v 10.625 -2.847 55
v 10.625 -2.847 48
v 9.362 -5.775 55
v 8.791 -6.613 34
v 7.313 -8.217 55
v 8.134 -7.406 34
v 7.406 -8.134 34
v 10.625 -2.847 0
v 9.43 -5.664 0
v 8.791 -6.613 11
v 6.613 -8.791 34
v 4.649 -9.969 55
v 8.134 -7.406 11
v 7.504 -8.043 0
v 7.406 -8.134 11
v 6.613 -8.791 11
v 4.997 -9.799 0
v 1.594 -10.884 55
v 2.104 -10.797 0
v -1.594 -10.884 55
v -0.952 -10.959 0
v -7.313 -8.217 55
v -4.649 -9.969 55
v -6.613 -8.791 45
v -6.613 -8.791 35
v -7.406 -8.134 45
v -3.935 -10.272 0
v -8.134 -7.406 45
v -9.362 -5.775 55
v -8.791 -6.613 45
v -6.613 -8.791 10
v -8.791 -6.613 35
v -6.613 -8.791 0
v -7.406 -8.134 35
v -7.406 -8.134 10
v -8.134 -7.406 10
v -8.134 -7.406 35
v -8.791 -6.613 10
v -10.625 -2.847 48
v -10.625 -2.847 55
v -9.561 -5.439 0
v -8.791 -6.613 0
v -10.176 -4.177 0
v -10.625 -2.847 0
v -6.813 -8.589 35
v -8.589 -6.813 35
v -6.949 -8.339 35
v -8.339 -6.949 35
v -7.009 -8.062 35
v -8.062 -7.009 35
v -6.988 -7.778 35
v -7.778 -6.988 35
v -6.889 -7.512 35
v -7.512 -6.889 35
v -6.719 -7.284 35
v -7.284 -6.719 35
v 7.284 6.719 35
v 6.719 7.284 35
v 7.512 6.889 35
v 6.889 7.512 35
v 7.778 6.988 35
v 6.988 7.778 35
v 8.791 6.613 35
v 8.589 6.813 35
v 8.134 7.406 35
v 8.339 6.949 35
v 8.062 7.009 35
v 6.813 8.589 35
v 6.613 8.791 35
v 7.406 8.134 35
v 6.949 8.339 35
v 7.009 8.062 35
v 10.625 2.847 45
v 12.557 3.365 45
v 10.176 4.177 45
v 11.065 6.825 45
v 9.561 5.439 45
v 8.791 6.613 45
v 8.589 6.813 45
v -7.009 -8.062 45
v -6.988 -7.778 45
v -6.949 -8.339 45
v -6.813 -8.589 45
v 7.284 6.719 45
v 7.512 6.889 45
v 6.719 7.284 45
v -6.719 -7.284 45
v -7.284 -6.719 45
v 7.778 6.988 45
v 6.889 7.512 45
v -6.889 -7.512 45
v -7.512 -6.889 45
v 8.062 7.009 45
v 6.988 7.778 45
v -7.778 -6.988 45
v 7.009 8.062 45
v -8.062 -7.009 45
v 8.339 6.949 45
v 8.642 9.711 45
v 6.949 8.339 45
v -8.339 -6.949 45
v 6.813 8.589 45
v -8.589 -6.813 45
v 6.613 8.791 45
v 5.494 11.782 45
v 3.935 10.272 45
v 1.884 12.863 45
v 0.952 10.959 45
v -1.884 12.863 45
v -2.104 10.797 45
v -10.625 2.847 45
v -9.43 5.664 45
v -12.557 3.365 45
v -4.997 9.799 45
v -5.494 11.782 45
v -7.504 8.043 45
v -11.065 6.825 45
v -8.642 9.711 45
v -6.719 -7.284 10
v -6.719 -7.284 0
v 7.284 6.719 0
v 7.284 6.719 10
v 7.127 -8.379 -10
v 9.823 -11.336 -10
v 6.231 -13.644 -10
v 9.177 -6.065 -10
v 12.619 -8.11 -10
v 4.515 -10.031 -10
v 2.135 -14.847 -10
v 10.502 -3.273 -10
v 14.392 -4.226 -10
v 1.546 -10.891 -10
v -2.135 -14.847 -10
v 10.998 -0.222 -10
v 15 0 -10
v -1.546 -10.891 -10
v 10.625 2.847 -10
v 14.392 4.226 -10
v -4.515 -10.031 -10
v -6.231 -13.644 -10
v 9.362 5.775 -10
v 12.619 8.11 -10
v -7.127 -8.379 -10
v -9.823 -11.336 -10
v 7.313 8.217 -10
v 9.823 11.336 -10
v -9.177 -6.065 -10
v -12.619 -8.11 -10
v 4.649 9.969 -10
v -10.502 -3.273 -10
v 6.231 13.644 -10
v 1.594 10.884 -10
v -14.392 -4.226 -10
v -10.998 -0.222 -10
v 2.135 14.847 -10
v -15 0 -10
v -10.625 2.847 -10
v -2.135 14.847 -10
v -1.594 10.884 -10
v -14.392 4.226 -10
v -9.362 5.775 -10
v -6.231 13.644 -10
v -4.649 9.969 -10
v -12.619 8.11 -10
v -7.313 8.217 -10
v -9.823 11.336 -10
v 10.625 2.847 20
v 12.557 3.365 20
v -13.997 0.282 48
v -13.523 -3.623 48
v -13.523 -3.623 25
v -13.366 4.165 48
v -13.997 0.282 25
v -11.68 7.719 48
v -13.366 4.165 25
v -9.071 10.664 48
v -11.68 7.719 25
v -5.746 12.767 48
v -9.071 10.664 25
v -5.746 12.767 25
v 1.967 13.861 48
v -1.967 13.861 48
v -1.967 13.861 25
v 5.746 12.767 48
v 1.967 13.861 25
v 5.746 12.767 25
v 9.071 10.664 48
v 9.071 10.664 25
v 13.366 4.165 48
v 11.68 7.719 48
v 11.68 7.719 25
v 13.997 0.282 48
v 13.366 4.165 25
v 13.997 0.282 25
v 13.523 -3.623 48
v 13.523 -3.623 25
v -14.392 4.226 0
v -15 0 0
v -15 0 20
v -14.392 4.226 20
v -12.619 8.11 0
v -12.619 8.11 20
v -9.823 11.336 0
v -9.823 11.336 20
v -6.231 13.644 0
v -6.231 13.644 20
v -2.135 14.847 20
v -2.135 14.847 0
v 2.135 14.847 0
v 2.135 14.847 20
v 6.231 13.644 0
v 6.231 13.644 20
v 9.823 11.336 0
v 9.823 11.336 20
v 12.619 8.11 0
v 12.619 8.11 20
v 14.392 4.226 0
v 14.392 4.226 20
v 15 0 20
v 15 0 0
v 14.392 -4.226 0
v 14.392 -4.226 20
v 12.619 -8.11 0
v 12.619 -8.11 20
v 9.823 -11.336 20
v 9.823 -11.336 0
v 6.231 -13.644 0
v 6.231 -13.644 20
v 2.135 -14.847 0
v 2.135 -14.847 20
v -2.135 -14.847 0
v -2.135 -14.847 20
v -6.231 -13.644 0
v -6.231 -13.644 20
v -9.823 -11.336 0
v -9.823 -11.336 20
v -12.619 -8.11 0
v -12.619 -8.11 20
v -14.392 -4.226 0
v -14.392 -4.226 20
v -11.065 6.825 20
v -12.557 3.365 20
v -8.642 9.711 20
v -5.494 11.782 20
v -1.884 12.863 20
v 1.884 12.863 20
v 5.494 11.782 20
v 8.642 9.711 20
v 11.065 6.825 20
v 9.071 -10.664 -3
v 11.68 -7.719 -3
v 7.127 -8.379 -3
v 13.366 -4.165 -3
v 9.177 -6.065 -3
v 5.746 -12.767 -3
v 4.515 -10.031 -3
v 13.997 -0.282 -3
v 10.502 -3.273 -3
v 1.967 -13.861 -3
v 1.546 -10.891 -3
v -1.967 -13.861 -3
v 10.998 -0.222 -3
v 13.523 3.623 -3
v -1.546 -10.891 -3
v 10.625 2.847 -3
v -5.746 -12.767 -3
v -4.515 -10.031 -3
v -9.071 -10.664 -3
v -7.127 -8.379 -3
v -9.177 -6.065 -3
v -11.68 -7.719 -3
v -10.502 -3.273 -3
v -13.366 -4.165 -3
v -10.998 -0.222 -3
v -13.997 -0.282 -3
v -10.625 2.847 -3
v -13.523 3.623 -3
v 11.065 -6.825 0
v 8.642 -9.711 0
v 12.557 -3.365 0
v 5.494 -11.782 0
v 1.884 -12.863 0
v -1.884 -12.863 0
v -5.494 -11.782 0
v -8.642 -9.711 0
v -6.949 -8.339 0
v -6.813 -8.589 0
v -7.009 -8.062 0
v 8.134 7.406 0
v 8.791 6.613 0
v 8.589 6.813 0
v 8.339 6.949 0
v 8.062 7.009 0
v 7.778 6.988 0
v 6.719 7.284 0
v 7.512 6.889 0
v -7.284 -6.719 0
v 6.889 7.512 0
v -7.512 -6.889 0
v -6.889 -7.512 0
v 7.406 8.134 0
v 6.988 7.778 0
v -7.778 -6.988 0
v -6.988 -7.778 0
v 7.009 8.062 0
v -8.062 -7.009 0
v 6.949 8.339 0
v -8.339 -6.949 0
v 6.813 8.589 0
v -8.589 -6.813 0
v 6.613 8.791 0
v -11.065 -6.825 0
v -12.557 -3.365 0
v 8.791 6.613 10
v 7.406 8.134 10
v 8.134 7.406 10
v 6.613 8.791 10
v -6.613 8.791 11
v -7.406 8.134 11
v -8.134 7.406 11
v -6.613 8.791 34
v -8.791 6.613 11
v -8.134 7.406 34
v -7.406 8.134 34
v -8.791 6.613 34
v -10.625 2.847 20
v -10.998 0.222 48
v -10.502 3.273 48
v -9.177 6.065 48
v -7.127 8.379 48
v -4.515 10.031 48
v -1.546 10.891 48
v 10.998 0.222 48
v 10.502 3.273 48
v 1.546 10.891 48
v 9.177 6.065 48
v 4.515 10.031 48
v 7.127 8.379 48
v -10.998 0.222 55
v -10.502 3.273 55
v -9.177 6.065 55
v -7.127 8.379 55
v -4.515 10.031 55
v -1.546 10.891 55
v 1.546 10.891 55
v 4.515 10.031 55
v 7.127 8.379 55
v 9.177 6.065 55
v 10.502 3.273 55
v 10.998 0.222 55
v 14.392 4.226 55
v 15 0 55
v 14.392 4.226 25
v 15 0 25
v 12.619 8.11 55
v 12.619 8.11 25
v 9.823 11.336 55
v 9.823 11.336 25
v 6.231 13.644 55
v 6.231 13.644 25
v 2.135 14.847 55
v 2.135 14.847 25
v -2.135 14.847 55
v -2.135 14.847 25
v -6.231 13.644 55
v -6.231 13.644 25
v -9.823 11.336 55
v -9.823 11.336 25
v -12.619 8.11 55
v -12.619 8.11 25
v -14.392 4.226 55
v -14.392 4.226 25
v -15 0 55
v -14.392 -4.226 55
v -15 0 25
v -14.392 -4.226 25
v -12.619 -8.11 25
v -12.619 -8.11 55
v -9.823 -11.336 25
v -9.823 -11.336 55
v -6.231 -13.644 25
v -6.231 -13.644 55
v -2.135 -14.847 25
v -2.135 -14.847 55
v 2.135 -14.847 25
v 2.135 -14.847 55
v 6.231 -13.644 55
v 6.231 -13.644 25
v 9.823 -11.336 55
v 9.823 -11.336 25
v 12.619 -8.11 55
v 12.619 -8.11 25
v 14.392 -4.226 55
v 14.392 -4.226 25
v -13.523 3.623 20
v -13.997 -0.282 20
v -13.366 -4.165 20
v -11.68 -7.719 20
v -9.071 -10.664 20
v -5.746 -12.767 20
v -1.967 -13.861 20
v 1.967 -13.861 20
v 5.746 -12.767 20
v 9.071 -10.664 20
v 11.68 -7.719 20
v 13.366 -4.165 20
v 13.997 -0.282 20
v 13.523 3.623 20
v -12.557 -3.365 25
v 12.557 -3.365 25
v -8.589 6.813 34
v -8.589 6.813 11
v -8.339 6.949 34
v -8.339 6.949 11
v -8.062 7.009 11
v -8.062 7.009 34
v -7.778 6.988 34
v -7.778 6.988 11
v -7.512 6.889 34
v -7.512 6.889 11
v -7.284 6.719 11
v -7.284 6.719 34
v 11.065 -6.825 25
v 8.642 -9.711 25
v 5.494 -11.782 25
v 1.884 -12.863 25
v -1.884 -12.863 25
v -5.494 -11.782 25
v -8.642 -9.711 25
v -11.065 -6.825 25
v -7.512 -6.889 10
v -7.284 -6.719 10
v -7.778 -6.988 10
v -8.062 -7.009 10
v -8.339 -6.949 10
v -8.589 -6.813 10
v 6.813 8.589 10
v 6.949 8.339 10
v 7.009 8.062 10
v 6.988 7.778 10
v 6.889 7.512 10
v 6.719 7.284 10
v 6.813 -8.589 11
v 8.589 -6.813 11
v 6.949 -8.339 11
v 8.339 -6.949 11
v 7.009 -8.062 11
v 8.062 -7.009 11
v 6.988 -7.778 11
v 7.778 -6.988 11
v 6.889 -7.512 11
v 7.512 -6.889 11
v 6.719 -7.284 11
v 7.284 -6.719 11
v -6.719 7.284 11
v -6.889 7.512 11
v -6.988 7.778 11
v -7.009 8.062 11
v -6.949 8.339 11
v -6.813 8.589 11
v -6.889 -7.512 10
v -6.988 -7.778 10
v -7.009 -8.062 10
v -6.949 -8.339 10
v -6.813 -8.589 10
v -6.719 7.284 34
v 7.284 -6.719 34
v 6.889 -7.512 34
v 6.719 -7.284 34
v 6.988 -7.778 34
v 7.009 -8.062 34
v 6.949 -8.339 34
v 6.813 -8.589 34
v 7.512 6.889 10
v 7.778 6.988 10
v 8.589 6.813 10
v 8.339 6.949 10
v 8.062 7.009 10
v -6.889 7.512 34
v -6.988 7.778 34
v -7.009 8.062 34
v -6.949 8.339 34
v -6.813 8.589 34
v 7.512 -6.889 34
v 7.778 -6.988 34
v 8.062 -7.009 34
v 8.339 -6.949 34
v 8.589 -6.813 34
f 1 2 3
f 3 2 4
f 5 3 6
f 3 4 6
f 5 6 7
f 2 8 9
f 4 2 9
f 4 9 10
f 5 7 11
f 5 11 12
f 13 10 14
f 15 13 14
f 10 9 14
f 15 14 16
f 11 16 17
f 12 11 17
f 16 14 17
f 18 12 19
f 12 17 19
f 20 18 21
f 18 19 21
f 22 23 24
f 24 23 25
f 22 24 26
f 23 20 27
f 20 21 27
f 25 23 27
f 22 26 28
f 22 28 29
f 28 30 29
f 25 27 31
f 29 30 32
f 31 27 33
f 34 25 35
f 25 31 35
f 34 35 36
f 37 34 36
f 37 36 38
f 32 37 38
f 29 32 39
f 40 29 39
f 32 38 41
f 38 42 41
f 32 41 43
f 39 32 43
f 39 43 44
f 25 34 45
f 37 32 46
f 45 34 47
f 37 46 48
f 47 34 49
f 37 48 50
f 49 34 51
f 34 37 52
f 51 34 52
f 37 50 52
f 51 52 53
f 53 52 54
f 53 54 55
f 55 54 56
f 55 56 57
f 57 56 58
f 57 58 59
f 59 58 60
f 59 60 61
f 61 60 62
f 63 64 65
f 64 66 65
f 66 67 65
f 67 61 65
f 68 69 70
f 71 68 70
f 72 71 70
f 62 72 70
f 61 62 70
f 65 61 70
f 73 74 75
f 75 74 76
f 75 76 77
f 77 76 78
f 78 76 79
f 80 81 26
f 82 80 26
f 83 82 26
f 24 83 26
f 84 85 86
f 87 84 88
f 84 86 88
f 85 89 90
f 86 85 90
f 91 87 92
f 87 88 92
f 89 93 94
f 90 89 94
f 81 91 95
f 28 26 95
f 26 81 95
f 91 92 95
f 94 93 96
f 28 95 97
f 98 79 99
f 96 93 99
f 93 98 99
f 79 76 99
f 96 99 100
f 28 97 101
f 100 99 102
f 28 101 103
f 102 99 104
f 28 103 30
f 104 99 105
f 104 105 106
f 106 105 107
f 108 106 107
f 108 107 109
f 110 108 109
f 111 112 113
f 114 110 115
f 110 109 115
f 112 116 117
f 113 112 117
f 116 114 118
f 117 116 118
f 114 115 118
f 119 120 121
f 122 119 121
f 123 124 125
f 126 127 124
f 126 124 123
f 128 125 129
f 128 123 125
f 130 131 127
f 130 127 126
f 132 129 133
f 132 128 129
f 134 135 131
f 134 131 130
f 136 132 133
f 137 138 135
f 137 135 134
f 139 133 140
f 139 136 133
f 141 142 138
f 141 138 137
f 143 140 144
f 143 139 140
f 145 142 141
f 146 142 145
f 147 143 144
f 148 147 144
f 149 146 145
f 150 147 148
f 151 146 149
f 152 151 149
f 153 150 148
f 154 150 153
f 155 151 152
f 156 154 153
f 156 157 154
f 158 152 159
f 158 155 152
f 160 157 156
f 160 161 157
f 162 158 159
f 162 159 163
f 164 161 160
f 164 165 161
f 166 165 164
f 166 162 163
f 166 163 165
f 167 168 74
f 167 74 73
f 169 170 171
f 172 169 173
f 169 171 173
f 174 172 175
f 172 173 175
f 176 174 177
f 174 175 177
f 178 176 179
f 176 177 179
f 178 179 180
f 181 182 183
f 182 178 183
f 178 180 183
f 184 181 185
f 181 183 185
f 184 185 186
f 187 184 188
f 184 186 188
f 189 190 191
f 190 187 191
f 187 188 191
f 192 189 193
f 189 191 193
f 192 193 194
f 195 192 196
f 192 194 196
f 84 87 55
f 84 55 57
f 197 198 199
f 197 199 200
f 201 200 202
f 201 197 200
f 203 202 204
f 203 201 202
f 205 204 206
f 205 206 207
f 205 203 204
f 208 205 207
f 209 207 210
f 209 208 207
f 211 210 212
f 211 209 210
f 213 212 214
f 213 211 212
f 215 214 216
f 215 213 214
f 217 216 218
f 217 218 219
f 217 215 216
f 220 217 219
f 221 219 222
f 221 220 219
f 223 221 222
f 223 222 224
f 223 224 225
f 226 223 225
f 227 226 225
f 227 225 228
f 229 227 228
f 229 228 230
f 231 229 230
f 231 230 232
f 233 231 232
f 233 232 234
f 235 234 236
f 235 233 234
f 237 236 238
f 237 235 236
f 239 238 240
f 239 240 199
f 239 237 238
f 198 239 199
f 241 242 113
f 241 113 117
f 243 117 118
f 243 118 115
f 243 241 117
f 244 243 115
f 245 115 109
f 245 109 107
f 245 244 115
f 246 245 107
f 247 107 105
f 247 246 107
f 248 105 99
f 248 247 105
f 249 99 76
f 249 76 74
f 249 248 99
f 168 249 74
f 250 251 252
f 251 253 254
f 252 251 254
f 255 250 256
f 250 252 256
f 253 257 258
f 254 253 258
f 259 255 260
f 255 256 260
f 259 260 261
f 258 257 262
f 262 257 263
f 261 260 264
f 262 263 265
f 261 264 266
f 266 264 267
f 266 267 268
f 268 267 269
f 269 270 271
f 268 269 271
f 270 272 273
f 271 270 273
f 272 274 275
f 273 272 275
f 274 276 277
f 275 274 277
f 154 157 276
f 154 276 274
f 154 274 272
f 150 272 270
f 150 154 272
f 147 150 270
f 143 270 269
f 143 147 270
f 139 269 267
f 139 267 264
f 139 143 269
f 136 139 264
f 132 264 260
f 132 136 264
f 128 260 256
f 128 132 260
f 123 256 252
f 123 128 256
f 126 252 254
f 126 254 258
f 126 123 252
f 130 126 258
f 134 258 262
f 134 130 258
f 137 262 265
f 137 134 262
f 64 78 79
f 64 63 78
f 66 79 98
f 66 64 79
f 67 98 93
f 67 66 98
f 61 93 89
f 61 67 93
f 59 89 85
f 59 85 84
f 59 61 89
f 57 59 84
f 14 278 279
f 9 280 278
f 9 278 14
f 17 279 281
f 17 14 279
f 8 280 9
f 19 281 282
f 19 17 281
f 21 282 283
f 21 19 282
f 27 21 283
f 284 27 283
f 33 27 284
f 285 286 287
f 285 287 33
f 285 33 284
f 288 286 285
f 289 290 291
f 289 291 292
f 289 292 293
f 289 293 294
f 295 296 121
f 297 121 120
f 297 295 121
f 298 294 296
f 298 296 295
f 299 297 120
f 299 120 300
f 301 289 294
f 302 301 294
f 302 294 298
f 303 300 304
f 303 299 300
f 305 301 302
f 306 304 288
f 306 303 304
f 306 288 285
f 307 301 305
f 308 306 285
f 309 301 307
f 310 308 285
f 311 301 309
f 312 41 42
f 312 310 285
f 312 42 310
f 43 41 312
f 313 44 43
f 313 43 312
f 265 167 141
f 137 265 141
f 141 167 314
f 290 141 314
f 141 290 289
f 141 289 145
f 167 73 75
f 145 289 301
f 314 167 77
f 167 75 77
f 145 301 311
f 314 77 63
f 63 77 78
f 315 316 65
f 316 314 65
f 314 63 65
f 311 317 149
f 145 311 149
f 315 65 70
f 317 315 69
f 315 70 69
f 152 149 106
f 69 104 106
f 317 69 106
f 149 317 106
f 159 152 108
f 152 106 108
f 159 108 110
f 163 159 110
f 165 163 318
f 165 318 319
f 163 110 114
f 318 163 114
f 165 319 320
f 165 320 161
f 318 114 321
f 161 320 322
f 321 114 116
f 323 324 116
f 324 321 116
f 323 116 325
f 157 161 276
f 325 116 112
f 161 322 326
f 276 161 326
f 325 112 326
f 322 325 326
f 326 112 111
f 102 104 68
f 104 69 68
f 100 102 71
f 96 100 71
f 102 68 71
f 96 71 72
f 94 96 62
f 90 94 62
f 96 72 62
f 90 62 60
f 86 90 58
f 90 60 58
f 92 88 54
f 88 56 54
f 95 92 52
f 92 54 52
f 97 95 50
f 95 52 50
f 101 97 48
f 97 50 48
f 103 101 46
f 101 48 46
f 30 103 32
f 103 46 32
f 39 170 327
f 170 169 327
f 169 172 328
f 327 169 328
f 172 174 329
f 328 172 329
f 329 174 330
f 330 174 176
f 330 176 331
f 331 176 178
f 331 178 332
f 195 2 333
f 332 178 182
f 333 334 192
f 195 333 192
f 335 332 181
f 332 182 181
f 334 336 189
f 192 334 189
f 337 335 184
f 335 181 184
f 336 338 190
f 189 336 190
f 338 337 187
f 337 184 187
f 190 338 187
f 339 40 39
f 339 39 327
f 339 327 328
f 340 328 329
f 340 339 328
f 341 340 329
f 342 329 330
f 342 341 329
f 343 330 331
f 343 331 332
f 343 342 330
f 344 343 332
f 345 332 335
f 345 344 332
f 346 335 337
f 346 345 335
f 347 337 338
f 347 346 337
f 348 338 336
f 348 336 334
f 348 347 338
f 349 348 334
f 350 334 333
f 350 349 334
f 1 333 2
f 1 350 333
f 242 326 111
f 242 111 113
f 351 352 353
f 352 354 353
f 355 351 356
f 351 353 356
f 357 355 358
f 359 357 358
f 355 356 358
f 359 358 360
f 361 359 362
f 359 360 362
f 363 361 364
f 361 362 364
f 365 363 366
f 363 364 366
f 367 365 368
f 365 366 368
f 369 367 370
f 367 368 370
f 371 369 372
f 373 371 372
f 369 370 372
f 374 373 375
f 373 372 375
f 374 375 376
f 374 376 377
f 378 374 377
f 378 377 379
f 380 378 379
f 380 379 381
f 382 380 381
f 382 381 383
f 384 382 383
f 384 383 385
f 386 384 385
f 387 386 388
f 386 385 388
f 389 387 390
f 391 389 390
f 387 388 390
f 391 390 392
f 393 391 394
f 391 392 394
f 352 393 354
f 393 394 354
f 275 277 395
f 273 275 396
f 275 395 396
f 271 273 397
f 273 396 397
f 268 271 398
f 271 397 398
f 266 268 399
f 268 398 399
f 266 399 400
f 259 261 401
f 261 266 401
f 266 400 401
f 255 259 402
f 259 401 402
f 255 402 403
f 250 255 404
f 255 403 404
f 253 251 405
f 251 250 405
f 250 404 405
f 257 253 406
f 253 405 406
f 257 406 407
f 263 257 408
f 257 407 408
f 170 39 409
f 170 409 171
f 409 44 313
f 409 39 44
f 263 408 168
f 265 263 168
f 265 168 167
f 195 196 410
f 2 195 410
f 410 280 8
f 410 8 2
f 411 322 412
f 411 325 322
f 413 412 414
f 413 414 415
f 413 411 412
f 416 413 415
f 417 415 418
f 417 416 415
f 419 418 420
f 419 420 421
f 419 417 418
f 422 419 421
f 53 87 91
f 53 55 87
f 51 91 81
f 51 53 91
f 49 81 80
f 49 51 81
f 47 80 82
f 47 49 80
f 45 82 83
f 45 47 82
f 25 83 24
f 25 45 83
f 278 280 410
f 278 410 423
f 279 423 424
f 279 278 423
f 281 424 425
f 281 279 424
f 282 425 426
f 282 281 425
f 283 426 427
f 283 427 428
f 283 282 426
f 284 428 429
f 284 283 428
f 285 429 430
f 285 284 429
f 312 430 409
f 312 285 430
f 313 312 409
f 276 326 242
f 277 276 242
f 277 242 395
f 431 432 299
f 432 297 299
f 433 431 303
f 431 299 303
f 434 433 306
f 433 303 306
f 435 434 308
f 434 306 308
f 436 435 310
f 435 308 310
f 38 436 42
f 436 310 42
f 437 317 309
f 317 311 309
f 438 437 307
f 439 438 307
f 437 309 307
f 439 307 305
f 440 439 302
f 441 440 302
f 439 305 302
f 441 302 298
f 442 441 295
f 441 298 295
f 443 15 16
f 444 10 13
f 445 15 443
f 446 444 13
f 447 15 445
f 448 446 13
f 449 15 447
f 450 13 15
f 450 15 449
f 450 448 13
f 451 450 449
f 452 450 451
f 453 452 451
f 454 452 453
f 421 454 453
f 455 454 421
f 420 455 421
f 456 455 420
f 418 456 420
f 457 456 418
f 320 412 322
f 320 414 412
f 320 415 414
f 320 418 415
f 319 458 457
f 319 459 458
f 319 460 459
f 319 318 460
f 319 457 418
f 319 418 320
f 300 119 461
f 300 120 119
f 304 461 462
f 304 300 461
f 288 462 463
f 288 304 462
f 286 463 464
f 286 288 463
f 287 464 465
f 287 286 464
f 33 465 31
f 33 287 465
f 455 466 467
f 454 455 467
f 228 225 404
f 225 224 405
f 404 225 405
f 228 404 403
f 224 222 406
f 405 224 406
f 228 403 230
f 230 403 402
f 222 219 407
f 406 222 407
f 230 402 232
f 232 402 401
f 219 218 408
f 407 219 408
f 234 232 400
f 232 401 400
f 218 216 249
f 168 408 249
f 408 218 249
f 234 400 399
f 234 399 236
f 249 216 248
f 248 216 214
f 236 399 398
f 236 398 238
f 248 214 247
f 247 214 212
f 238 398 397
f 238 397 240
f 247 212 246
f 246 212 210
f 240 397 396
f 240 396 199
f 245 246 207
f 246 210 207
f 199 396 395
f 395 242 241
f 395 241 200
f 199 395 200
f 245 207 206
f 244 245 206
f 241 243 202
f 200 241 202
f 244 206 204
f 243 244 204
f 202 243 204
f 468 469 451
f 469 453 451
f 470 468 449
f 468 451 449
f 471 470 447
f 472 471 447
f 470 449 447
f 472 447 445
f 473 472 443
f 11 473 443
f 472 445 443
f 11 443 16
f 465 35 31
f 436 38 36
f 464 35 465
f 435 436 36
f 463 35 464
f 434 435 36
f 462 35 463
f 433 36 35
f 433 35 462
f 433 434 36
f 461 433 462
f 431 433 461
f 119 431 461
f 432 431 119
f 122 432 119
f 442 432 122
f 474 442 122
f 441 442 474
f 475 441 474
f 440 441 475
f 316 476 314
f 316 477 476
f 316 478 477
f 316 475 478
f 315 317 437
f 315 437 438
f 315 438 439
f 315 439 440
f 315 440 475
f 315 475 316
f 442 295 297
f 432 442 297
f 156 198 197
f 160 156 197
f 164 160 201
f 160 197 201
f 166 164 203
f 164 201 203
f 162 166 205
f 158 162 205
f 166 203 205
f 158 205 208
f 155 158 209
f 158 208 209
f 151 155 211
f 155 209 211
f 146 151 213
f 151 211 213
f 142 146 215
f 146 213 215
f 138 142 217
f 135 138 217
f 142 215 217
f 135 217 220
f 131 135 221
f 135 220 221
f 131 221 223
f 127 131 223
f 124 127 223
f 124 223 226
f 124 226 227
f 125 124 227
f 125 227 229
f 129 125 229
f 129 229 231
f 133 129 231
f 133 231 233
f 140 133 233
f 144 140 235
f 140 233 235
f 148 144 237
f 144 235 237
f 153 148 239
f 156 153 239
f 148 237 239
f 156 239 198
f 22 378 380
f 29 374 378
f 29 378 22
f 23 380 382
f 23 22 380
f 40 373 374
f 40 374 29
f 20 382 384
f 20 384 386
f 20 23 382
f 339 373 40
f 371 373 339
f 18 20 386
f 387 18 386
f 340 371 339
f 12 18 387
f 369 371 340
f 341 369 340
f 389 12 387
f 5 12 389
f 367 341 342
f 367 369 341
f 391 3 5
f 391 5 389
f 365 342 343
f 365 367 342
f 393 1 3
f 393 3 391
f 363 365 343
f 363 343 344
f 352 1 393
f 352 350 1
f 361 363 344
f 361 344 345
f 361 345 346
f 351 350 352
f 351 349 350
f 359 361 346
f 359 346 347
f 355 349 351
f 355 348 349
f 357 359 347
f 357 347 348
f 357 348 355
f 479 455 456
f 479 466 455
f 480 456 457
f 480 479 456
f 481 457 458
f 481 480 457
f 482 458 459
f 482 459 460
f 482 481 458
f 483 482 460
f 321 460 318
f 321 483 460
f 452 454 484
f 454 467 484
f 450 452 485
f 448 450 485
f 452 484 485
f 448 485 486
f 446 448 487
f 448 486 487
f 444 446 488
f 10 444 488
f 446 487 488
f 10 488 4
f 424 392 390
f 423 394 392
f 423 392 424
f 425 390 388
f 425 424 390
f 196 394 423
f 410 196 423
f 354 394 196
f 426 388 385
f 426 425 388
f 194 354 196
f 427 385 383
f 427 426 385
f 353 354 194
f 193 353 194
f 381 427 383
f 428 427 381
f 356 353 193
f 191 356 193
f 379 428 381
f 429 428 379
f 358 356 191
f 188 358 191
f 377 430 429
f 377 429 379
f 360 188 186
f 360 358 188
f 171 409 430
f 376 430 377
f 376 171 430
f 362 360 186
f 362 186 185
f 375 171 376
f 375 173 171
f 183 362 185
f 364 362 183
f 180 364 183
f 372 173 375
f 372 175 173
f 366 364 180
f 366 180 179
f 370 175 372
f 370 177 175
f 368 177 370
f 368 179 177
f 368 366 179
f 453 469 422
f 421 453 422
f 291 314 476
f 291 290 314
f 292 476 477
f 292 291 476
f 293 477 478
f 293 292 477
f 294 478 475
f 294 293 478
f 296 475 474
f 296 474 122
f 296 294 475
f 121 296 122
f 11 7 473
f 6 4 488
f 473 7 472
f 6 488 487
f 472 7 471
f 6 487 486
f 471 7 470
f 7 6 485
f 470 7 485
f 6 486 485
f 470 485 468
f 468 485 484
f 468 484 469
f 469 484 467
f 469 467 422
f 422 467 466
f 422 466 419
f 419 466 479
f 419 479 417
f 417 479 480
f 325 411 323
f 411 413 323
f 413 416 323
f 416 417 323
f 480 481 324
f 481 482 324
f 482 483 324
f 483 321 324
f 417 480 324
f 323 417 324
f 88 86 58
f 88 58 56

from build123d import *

# Parameters (mm, degrees)
SKETCH1_R                = 15
BOSS_EXTRUDE1_DEPTH      = 45
SKETCH2_R                = 15
SKETCH2_R_2              = 13
CUT_EXTRUDE1_DEPTH       = 25
BOSS_EXTRUDE4_DEPTH      = 10
SKETCH6_R                = 15
BOSS_EXTRUDE5_DEPTH      = 20
BOSS_EXTRUDE6_DEPTH      = 45
BOSS_EXTRUDE7_DEPTH      = 11.5
BOSS_EXTRUDE7_DEPTH_BACK = 11.5
FILLET1_R                = 1
SKETCH9_R                = 15
BOSS_EXTRUDE8_DEPTH      = 10
BOSS_EXTRUDE9_DEPTH      = 7
SKETCH11_R               = 15
BOSS_EXTRUDE10_DEPTH     = 10
BOSS_EXTRUDE11_DEPTH     = 7


with BuildPart() as part:
    # Sketch1 → Boss-Extrude1 (new body)
    with BuildSketch(Plane.XY):
        Circle(SKETCH1_R)
        with BuildLine():
            Line((-10.625184089, -2.847009496), (-13.522961568, -3.623466631))
            ThreePointArc((-13.522961568, -3.623466631), (0, 14), (13.522961568, -3.623466631))
            Line((13.522961568, -3.623466631), (10.625184089, -2.847009496))
            ThreePointArc((10.625184089, -2.847009496), (0, -11), (-10.625184089, -2.847009496))
        make_face(mode=Mode.SUBTRACT)
    extrude(amount=BOSS_EXTRUDE1_DEPTH)

    # Sketch2 → Cut-Extrude1 (cut)
    with BuildSketch(Plane(origin=(0, 0, 0), x_dir=(-1, 0, 0), z_dir=(0, 0, -1))):
        Circle(SKETCH2_R)
        Circle(SKETCH2_R_2, mode=Mode.SUBTRACT)
    extrude(amount=-CUT_EXTRUDE1_DEPTH, mode=Mode.SUBTRACT)

    # Sketch5 → Boss-Extrude4 (add)
    with BuildSketch(Plane.XY.offset(45)):
        Polygon((-7.495331881, -8.061017306), (8.061017306, 7.495331881), (7.495331881, 8.061017306), (-8.061017306, -7.495331881), align=None)
    boss_extrude4 = extrude(amount=-BOSS_EXTRUDE4_DEPTH)

    # Mirror1: Boss-Extrude4 across plane
    add(boss_extrude4.mirror(Plane.XY.offset(22.5)))

    # Sketch6 → Boss-Extrude5 (add)
    with BuildSketch(Plane(origin=(0, 0, 0), x_dir=(-1, 0, 0), z_dir=(0, 0, -1))):
        Circle(SKETCH6_R)
        with BuildLine():
            Line((10.625184089, 2.847009496), (13.522961568, 3.623466631))
            ThreePointArc((13.522961568, 3.623466631), (0, -14), (-13.522961568, 3.623466631))
            Line((-13.522961568, 3.623466631), (-10.625184089, 2.847009496))
            ThreePointArc((-10.625184089, 2.847009496), (0, 11), (10.625184089, 2.847009496))
        make_face(mode=Mode.SUBTRACT)
    extrude(amount=-BOSS_EXTRUDE5_DEPTH)

    # Sketch7 → Boss-Extrude6 (add)
    with BuildSketch(Plane(origin=(0, 0, 0), x_dir=(-1, 0, 0), z_dir=(0, 0, -1))):
        with BuildLine():
            Line((-12.557035742, 3.364647586), (-10.625184089, 2.847009496))
            ThreePointArc((-10.625184089, 2.847009496), (0, 11), (10.625184089, 2.847009496))
            Line((10.625184089, 2.847009496), (12.557035742, 3.364647586))
            ThreePointArc((12.557035742, 3.364647586), (0, 13), (-12.557035742, 3.364647586))
        make_face()
    extrude(amount=-BOSS_EXTRUDE6_DEPTH)

    # Sketch8 → Boss-Extrude7 (add, two sides)
    with BuildSketch(Plane.XY.offset(22.5)) as boss_extrude7_sk:
        Polygon((8.061017306, -7.495331881), (7.495331881, -8.061017306), (-8.061017306, 7.495331881), (-7.495331881, 8.061017306), align=None)
    extrude(amount=BOSS_EXTRUDE7_DEPTH)
    extrude(boss_extrude7_sk.sketch, amount=-BOSS_EXTRUDE7_DEPTH_BACK)

    # Fillet1
    fillet1_edges = [part.edges().sort_by_distance(p)[0] for p in [
        (7.490187585, 8.05587301, 40),
        (8.05587301, 7.490187585, 40),
        (-8.05587301, 7.490187585, 22.5),
        (-7.490187585, 8.05587301, 22.5),
        (8.05587301, -7.490187585, 22.5),
        (7.490187585, -8.05587301, 22.5),
        (-7.490187585, -8.05587301, 40),
        (-8.05587301, -7.490187585, 40),
        (-8.05587301, -7.490187585, 5),
        (-7.490187585, -8.05587301, 5),
        (8.05587301, 7.490187585, 5),
        (7.490187585, 8.05587301, 5),
    ]]
    fillet(fillet1_edges, radius=FILLET1_R)

    # Sketch9 → Boss-Extrude8 (add)
    with BuildSketch(Plane.XY.offset(45)):
        Circle(SKETCH9_R)
        with BuildLine():
            Line((13.522961568, -3.623466631), (10.625184089, -2.847009496))
            ThreePointArc((10.625184089, -2.847009496), (0, -11), (-10.625184089, -2.847009496))
            Line((-10.625184089, -2.847009496), (-13.522961568, -3.623466631))
            ThreePointArc((-13.522961568, -3.623466631), (0, 14), (13.522961568, -3.623466631))
        make_face(mode=Mode.SUBTRACT)
    extrude(amount=BOSS_EXTRUDE8_DEPTH)

    # Sketch10 → Boss-Extrude9 (add)
    with BuildSketch(Plane.XY.offset(55)):
        with BuildLine():
            Line((-13.522961568, -3.623466631), (-10.625184089, -2.847009496))
            ThreePointArc((-10.625184089, -2.847009496), (0, 11), (10.625184089, -2.847009496))
            Line((10.625184089, -2.847009496), (13.522961568, -3.623466631))
            ThreePointArc((13.522961568, -3.623466631), (0, 14), (-13.522961568, -3.623466631))
        make_face()
    extrude(amount=-BOSS_EXTRUDE9_DEPTH)

    # Sketch11 → Boss-Extrude10 (add)
    with BuildSketch(Plane(origin=(0, 0, 0), x_dir=(-1, 0, 0), z_dir=(0, 0, -1))):
        Circle(SKETCH11_R)
        with BuildLine():
            Line((10.625184089, 2.847009496), (13.522961568, 3.623466631))
            ThreePointArc((13.522961568, 3.623466631), (0, -14), (-13.522961568, 3.623466631))
            Line((-13.522961568, 3.623466631), (-10.625184089, 2.847009496))
            ThreePointArc((-10.625184089, 2.847009496), (0, 11), (10.625184089, 2.847009496))
        make_face(mode=Mode.SUBTRACT)
    extrude(amount=BOSS_EXTRUDE10_DEPTH)

    # Sketch12 → Boss-Extrude11 (add)
    with BuildSketch(Plane(origin=(0, 0, -10), x_dir=(-1, 0, 0), z_dir=(0, 0, -1))):
        with BuildLine():
            Line((13.522961568, 3.623466631), (10.625184089, 2.847009496))
            ThreePointArc((10.625184089, 2.847009496), (0, -11), (-10.625184089, 2.847009496))
            Line((-10.625184089, 2.847009496), (-13.522961568, 3.623466631))
            ThreePointArc((-13.522961568, 3.623466631), (0, -14), (13.522961568, 3.623466631))
        make_face()
    extrude(amount=-BOSS_EXTRUDE11_DEPTH)


solid = part.part
